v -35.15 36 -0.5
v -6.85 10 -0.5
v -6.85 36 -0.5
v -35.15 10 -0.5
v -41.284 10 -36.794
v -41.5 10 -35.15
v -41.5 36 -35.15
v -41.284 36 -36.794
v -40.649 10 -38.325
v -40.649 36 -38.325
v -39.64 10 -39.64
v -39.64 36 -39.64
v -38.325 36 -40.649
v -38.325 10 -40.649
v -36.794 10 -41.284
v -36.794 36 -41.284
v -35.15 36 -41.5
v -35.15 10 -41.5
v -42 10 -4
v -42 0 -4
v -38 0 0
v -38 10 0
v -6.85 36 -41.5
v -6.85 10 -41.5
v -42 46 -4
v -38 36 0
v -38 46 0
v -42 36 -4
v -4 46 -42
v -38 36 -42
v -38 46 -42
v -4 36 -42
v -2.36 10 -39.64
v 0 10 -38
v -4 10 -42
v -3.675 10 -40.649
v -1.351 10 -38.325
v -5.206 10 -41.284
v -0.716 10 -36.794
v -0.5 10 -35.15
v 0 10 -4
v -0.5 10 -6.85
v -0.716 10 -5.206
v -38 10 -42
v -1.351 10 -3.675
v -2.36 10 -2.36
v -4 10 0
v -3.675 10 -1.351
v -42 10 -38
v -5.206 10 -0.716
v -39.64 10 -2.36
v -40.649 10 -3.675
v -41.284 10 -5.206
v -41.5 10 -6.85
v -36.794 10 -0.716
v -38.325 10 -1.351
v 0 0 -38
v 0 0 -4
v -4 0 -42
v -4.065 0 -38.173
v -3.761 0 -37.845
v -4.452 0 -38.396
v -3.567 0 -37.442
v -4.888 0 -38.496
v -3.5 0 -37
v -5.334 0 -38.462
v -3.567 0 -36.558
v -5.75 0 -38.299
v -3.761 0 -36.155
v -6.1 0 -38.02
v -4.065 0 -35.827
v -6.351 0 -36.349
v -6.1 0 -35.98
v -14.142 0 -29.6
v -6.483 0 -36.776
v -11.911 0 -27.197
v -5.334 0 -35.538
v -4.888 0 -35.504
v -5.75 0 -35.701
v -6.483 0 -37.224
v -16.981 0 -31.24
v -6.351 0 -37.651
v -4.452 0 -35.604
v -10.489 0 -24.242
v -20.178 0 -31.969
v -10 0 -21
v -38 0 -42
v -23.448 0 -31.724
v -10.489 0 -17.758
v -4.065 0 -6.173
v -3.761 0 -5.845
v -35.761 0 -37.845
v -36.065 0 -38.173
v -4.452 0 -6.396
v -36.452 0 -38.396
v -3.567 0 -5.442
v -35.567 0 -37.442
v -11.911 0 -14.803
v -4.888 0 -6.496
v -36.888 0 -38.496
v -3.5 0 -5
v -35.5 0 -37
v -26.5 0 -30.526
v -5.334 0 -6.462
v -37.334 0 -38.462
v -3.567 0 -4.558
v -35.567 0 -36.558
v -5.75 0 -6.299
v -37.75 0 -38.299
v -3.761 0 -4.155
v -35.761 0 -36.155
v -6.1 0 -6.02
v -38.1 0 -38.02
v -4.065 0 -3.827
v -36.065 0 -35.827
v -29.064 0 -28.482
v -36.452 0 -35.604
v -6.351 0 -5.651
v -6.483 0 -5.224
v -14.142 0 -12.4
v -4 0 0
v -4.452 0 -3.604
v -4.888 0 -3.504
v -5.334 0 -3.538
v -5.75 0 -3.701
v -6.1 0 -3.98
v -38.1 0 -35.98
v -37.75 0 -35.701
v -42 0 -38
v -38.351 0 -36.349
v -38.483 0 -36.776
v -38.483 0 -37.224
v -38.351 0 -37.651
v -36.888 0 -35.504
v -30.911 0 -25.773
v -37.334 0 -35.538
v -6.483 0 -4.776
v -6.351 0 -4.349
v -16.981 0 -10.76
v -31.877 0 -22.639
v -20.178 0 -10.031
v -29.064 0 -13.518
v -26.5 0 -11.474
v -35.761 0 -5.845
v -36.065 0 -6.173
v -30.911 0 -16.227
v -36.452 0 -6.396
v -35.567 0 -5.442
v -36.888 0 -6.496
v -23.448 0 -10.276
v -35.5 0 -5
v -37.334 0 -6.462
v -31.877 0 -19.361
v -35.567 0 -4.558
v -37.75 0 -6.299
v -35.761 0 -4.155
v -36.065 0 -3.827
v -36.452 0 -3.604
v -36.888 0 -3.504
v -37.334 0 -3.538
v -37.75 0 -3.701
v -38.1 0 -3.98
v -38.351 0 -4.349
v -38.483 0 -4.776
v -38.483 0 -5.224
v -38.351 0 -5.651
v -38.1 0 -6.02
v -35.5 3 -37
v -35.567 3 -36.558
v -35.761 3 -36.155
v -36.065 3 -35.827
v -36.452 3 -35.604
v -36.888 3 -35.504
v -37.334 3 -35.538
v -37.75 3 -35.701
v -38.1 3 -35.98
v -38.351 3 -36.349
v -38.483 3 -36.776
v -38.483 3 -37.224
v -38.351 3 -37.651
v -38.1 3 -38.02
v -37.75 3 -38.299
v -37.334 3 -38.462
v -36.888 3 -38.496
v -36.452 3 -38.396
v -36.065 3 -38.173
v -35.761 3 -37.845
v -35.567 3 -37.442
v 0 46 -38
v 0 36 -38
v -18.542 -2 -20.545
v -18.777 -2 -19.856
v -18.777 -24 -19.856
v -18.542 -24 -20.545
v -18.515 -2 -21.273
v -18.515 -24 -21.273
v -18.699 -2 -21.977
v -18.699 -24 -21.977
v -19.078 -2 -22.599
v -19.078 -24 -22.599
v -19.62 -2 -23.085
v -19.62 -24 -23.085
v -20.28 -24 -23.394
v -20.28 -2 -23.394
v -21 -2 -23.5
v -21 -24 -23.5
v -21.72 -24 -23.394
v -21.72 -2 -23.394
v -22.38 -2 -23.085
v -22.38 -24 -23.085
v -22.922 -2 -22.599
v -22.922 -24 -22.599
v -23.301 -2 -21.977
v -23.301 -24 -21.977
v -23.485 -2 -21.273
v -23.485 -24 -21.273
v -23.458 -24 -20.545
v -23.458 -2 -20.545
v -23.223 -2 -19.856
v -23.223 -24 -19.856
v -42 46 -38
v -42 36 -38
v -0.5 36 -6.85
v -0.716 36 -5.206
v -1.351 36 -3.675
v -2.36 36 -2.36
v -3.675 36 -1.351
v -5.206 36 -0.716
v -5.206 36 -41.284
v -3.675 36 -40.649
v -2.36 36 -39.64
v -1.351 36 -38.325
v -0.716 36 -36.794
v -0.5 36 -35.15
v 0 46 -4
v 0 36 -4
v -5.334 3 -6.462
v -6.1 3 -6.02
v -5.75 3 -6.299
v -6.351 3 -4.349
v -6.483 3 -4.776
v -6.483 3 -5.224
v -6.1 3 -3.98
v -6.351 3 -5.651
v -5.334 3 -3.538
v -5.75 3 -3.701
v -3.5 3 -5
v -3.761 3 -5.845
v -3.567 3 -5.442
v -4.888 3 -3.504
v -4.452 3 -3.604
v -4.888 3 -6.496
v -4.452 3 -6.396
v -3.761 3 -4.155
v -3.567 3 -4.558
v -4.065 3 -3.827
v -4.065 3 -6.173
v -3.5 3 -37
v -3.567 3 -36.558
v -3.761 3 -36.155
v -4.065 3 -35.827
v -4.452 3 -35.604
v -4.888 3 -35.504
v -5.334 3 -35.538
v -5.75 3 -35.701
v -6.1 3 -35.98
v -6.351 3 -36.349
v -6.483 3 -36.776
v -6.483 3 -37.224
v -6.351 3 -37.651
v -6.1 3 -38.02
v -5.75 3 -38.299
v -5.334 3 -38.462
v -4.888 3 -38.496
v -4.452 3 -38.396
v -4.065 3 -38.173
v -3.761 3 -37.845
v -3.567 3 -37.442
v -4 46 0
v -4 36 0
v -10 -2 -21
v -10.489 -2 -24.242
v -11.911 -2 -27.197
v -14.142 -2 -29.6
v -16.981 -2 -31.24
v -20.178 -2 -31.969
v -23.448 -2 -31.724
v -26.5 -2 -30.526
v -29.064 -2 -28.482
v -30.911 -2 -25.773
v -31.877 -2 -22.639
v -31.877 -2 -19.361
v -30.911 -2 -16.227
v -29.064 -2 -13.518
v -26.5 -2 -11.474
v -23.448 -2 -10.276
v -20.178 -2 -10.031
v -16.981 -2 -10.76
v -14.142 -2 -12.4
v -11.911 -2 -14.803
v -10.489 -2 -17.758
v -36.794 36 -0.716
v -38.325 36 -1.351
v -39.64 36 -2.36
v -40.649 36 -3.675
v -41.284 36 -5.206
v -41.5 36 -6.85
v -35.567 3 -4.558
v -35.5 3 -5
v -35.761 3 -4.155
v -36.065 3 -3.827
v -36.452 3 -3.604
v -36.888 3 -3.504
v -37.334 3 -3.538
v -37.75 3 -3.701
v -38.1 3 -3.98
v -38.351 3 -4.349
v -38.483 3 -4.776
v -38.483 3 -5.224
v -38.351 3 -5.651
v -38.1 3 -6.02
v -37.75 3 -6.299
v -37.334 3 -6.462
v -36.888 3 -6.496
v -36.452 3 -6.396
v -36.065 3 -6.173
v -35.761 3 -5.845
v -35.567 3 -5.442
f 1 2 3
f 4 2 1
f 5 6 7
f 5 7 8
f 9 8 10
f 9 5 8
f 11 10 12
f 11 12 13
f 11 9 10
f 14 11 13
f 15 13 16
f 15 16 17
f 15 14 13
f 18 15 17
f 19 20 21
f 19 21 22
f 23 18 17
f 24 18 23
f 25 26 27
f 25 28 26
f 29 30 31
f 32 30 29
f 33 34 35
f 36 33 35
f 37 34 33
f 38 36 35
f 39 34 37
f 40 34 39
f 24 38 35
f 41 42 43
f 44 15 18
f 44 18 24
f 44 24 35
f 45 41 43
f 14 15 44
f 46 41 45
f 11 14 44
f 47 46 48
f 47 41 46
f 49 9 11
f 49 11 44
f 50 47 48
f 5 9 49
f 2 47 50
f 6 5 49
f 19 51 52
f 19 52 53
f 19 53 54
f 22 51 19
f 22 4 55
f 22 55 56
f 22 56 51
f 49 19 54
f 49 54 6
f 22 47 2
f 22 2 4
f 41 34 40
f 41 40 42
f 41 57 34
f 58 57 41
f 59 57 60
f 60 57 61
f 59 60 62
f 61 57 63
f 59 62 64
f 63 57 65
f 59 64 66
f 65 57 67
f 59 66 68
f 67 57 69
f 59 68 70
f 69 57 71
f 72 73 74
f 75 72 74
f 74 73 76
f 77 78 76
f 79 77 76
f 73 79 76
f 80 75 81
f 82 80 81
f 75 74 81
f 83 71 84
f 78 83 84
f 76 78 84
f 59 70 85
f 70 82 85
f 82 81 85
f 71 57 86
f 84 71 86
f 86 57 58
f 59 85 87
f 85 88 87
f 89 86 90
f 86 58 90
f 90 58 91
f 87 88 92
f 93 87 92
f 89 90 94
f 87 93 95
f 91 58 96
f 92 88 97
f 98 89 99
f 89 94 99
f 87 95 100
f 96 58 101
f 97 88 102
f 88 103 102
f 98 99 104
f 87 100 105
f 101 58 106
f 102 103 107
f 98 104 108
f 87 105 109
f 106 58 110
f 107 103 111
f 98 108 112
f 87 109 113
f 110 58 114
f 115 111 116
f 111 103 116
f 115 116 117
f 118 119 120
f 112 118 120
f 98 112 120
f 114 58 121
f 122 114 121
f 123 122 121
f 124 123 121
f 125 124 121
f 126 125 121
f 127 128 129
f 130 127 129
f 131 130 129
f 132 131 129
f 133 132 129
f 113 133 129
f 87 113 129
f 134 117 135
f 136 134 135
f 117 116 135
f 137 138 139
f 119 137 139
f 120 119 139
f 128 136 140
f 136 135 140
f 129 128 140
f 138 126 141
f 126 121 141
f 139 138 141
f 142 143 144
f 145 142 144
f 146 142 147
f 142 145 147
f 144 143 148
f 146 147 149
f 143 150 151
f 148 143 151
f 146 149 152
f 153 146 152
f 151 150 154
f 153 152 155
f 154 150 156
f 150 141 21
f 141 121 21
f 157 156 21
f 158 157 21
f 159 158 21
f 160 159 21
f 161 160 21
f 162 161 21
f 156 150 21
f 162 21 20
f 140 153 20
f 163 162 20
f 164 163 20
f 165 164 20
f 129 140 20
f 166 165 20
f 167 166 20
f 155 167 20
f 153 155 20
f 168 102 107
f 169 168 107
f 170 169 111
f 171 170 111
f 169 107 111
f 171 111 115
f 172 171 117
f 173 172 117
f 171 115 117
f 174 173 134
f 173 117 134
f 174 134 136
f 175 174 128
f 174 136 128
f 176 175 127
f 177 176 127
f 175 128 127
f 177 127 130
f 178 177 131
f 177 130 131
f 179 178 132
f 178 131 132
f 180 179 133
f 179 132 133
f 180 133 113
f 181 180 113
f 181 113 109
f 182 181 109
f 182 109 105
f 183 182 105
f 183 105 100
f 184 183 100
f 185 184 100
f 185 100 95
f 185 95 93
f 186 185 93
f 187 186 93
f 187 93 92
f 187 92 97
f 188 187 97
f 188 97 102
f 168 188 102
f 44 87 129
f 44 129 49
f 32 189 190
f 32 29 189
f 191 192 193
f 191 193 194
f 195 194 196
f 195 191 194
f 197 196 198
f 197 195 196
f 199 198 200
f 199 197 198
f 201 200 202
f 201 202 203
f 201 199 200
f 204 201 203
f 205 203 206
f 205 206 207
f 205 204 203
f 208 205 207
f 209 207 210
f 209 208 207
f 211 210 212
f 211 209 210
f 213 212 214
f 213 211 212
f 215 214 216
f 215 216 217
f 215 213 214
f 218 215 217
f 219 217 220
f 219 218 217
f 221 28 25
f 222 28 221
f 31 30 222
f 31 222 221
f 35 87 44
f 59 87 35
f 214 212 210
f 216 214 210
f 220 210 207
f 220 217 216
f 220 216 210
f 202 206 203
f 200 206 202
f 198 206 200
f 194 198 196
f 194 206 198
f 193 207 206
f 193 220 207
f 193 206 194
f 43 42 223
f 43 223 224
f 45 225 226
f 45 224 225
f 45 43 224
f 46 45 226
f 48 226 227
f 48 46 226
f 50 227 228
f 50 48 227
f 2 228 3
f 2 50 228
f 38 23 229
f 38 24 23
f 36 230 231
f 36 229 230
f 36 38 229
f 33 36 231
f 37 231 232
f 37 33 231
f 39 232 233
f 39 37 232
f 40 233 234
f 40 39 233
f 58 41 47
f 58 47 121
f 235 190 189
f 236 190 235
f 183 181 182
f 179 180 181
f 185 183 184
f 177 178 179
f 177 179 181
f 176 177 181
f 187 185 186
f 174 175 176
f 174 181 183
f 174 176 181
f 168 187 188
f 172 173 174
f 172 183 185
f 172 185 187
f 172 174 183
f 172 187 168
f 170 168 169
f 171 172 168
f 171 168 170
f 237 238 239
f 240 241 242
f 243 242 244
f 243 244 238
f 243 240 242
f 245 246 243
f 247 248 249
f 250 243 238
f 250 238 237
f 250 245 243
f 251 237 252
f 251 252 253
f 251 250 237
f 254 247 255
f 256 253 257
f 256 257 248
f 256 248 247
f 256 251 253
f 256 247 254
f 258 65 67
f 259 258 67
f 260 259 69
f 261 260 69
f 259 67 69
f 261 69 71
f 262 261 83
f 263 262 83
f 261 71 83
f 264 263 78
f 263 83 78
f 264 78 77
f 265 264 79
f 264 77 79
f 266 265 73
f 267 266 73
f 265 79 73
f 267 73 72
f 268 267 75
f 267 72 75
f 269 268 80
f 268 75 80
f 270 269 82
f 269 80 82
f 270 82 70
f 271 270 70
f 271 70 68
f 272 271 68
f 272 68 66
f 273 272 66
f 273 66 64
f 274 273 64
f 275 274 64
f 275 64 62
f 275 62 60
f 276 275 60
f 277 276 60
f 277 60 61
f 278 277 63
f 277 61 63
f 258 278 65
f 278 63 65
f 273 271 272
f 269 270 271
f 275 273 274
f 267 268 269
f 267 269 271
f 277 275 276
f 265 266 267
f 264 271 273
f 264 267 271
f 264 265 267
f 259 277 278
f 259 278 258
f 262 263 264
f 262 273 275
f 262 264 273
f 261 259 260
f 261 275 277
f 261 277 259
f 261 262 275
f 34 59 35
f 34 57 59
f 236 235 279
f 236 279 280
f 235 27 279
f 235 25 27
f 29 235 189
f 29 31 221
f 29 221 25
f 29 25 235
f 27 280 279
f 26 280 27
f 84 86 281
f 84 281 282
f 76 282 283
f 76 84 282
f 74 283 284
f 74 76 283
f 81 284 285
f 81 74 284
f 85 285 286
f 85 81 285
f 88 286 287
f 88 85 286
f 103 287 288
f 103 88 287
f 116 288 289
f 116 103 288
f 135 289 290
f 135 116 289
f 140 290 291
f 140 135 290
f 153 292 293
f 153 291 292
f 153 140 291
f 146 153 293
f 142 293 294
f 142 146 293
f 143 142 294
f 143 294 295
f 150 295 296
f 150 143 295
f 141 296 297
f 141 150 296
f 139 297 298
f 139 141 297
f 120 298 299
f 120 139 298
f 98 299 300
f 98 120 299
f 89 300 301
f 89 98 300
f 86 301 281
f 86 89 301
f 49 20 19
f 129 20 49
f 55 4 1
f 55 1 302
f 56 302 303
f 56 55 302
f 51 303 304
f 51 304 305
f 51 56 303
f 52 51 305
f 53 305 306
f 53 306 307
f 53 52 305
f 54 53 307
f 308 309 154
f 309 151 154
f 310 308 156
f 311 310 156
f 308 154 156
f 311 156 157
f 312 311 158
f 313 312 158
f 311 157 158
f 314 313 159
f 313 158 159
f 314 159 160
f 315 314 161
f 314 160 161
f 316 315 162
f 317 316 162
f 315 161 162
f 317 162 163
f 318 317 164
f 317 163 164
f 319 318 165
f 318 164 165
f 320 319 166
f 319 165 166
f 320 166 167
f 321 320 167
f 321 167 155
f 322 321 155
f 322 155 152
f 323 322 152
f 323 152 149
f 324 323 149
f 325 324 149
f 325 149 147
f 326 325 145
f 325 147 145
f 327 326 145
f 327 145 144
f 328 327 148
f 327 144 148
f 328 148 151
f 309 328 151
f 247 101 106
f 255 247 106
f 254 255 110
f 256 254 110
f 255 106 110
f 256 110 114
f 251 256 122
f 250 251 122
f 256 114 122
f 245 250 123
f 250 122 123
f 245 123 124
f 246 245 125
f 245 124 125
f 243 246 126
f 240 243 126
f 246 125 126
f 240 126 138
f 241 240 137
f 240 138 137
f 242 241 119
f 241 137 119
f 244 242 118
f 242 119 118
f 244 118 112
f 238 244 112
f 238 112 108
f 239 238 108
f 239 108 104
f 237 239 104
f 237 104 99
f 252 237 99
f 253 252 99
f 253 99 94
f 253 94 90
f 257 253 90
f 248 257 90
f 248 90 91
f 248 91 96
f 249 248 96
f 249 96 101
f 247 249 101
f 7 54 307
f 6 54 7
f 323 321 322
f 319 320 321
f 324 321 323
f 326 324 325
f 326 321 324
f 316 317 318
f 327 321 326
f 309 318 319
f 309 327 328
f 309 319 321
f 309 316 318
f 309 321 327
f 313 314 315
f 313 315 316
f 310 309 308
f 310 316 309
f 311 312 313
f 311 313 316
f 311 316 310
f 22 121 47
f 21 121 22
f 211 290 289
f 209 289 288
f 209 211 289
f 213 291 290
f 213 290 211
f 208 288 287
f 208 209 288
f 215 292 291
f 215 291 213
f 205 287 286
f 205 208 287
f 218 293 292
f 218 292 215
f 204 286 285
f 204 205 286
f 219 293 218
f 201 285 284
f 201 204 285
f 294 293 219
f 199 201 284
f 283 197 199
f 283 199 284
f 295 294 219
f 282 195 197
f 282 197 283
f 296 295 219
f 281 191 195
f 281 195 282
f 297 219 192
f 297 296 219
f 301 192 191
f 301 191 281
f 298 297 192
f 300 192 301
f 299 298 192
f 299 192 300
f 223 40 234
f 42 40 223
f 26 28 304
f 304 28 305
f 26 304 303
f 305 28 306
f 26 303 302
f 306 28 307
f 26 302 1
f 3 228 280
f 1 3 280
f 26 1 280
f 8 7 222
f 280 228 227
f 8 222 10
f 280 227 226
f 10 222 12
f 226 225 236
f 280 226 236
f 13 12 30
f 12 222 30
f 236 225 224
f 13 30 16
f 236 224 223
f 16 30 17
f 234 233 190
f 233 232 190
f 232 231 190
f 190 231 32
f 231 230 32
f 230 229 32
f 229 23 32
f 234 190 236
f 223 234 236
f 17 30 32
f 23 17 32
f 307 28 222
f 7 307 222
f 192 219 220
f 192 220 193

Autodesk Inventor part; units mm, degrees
ref_plane "YZ Plane" through (0, 0, 0) normal (1, 0, 0) x (0, 1, 0)
ref_plane "XZ Plane" through (0, 0, 0) normal (0, 1, 0) x (-1, 0, 0)
ref_plane "XY Plane" through (0, 0, 0) normal (0, 0, 1) x (1, 0, 0)
sketch "Sketch1" plane through (0, 0, 0) normal (0, 1, 0) x (-1, 0, 0)
  line L0 (0, 0) -> (42, 0)
  line L1 (42, 0) -> (42, -42)
  line L2 (42, -42) -> (0, -42)
  line L3 (0, -42) -> (0, 0)
  dimension "d0" = 42
  dimension "d1" = 42
extrude "Extrusion1" add sketch "Sketch1" along normal blind 10
chamfer "Chamfer1" distance 4 angle 45 4 edges at (0, 5, 0) (0, 5, -42) (-42, 5, -42) (-42, 5, 0)
sketch "Sketch2" plane through (0, 10, 0) normal (0, 1, 0) x (1, 0, 0)
  point P0 (0, 0)
sketch "Sketch3" plane through (0, 10, 0) normal (0, 1, 0) x (1, 0, 0)
  line L0 (-0.5, 0.5) -> (-41.5, 0.5)
  line L1 (-41.5, 0.5) -> (-41.5, 41.5)
  line L2 (-41.5, 41.5) -> (-0.5, 41.5)
  line L3 (-0.5, 41.5) -> (-0.5, 0.5)
  line L4 (-0.5, 0.5) -> (-41.5, 41.5) construction
  line L5 (-41.5, 0.5) -> (-0.5, 41.5) construction
  point P0 (0, 0)
  point P1 (-21, 21)
  dimension "d7" = 41
  dimension "d8" = 41
extrude "Extrusion2" add sketch "Sketch3" along normal blind 26
fillet "Fillet1" radius 6.35 4 edges at (-41.5, 23, -41.5) (-0.5, 23, -41.5) (-41.5, 23, -0.5) (-0.5, 23, -0.5)
sketch "Sketch4" plane through (0, 36, 0) normal (0, 1, 0) x (1, 0, 0)
  line L0 (0, 0) -> (-42, 0)
  line L1 (-42, 0) -> (-42, 42)
  line L2 (-42, 42) -> (0, 42)
  line L3 (0, 42) -> (0, 0)
  dimension "d12" = 42
  dimension "d13" = 42
extrude "Extrusion3" add sketch "Sketch4" along normal blind 10
chamfer "Chamfer2" distance 4 angle 45 4 edges at (-42, 41, -42) (-42, 41, 0) (0, 41, -42) (0, 41, 0)
sketch "Sketch5" plane through (0, 0, 0) normal (0, -1, 0) x (1, 0, 0)
  circle A0 centre (-21, -21) radius 11
  point P0 (0, 0)
  dimension "d19" = 22
extrude "Extrusion4" add sketch "Sketch5" along normal blind 2
sketch "Sketch6" plane through (-21, -2, -21) normal (0, -1, 0) x (1, 0, 0)
  circle A0 centre (0, 0) radius 2.5
  point P0 (21, 21)
  dimension "d22" = 5
extrude "Extrusion5" add sketch "Sketch6" along normal blind 22
sketch "Sketch7" plane through (0, 0, 0) normal (0, -1, 0) x (1, 0, 0)
  circle A0 centre (-37, -5) radius 1.5
  circle A1 centre (-5, -5) radius 1.5
  circle A2 centre (-5, -37) radius 1.5
  circle A3 centre (-37, -37) radius 1.5
  point P0 (0, 0)
  dimension "d25" = 3
  dimension "d26" = 3
  dimension "d27" = 3
  dimension "d28" = 3
extrude "Extrusion6" cut sketch "Sketch7" against normal blind 3
sketch "Sketch8" plane through (-21, -24, -21) normal (0, -1, 0) x (1, 0, 0)
  circle A0 centre (0, 0) radius 2.5 projected
  arc A1 (-2.2228, 1.1442) -> (2.2228, 1.1442) centre (0, 0) ccw
  line L0 (-2.2228, 1.1442) -> (2.2228, 1.1442)
  point P0 (21, 21)
extrude "Extrusion7" cut sketch "Sketch8" against normal blind 22 contours L0 A0 picked at (0.2976, 1.8759)
properties part number "nema17_84Ncm"
